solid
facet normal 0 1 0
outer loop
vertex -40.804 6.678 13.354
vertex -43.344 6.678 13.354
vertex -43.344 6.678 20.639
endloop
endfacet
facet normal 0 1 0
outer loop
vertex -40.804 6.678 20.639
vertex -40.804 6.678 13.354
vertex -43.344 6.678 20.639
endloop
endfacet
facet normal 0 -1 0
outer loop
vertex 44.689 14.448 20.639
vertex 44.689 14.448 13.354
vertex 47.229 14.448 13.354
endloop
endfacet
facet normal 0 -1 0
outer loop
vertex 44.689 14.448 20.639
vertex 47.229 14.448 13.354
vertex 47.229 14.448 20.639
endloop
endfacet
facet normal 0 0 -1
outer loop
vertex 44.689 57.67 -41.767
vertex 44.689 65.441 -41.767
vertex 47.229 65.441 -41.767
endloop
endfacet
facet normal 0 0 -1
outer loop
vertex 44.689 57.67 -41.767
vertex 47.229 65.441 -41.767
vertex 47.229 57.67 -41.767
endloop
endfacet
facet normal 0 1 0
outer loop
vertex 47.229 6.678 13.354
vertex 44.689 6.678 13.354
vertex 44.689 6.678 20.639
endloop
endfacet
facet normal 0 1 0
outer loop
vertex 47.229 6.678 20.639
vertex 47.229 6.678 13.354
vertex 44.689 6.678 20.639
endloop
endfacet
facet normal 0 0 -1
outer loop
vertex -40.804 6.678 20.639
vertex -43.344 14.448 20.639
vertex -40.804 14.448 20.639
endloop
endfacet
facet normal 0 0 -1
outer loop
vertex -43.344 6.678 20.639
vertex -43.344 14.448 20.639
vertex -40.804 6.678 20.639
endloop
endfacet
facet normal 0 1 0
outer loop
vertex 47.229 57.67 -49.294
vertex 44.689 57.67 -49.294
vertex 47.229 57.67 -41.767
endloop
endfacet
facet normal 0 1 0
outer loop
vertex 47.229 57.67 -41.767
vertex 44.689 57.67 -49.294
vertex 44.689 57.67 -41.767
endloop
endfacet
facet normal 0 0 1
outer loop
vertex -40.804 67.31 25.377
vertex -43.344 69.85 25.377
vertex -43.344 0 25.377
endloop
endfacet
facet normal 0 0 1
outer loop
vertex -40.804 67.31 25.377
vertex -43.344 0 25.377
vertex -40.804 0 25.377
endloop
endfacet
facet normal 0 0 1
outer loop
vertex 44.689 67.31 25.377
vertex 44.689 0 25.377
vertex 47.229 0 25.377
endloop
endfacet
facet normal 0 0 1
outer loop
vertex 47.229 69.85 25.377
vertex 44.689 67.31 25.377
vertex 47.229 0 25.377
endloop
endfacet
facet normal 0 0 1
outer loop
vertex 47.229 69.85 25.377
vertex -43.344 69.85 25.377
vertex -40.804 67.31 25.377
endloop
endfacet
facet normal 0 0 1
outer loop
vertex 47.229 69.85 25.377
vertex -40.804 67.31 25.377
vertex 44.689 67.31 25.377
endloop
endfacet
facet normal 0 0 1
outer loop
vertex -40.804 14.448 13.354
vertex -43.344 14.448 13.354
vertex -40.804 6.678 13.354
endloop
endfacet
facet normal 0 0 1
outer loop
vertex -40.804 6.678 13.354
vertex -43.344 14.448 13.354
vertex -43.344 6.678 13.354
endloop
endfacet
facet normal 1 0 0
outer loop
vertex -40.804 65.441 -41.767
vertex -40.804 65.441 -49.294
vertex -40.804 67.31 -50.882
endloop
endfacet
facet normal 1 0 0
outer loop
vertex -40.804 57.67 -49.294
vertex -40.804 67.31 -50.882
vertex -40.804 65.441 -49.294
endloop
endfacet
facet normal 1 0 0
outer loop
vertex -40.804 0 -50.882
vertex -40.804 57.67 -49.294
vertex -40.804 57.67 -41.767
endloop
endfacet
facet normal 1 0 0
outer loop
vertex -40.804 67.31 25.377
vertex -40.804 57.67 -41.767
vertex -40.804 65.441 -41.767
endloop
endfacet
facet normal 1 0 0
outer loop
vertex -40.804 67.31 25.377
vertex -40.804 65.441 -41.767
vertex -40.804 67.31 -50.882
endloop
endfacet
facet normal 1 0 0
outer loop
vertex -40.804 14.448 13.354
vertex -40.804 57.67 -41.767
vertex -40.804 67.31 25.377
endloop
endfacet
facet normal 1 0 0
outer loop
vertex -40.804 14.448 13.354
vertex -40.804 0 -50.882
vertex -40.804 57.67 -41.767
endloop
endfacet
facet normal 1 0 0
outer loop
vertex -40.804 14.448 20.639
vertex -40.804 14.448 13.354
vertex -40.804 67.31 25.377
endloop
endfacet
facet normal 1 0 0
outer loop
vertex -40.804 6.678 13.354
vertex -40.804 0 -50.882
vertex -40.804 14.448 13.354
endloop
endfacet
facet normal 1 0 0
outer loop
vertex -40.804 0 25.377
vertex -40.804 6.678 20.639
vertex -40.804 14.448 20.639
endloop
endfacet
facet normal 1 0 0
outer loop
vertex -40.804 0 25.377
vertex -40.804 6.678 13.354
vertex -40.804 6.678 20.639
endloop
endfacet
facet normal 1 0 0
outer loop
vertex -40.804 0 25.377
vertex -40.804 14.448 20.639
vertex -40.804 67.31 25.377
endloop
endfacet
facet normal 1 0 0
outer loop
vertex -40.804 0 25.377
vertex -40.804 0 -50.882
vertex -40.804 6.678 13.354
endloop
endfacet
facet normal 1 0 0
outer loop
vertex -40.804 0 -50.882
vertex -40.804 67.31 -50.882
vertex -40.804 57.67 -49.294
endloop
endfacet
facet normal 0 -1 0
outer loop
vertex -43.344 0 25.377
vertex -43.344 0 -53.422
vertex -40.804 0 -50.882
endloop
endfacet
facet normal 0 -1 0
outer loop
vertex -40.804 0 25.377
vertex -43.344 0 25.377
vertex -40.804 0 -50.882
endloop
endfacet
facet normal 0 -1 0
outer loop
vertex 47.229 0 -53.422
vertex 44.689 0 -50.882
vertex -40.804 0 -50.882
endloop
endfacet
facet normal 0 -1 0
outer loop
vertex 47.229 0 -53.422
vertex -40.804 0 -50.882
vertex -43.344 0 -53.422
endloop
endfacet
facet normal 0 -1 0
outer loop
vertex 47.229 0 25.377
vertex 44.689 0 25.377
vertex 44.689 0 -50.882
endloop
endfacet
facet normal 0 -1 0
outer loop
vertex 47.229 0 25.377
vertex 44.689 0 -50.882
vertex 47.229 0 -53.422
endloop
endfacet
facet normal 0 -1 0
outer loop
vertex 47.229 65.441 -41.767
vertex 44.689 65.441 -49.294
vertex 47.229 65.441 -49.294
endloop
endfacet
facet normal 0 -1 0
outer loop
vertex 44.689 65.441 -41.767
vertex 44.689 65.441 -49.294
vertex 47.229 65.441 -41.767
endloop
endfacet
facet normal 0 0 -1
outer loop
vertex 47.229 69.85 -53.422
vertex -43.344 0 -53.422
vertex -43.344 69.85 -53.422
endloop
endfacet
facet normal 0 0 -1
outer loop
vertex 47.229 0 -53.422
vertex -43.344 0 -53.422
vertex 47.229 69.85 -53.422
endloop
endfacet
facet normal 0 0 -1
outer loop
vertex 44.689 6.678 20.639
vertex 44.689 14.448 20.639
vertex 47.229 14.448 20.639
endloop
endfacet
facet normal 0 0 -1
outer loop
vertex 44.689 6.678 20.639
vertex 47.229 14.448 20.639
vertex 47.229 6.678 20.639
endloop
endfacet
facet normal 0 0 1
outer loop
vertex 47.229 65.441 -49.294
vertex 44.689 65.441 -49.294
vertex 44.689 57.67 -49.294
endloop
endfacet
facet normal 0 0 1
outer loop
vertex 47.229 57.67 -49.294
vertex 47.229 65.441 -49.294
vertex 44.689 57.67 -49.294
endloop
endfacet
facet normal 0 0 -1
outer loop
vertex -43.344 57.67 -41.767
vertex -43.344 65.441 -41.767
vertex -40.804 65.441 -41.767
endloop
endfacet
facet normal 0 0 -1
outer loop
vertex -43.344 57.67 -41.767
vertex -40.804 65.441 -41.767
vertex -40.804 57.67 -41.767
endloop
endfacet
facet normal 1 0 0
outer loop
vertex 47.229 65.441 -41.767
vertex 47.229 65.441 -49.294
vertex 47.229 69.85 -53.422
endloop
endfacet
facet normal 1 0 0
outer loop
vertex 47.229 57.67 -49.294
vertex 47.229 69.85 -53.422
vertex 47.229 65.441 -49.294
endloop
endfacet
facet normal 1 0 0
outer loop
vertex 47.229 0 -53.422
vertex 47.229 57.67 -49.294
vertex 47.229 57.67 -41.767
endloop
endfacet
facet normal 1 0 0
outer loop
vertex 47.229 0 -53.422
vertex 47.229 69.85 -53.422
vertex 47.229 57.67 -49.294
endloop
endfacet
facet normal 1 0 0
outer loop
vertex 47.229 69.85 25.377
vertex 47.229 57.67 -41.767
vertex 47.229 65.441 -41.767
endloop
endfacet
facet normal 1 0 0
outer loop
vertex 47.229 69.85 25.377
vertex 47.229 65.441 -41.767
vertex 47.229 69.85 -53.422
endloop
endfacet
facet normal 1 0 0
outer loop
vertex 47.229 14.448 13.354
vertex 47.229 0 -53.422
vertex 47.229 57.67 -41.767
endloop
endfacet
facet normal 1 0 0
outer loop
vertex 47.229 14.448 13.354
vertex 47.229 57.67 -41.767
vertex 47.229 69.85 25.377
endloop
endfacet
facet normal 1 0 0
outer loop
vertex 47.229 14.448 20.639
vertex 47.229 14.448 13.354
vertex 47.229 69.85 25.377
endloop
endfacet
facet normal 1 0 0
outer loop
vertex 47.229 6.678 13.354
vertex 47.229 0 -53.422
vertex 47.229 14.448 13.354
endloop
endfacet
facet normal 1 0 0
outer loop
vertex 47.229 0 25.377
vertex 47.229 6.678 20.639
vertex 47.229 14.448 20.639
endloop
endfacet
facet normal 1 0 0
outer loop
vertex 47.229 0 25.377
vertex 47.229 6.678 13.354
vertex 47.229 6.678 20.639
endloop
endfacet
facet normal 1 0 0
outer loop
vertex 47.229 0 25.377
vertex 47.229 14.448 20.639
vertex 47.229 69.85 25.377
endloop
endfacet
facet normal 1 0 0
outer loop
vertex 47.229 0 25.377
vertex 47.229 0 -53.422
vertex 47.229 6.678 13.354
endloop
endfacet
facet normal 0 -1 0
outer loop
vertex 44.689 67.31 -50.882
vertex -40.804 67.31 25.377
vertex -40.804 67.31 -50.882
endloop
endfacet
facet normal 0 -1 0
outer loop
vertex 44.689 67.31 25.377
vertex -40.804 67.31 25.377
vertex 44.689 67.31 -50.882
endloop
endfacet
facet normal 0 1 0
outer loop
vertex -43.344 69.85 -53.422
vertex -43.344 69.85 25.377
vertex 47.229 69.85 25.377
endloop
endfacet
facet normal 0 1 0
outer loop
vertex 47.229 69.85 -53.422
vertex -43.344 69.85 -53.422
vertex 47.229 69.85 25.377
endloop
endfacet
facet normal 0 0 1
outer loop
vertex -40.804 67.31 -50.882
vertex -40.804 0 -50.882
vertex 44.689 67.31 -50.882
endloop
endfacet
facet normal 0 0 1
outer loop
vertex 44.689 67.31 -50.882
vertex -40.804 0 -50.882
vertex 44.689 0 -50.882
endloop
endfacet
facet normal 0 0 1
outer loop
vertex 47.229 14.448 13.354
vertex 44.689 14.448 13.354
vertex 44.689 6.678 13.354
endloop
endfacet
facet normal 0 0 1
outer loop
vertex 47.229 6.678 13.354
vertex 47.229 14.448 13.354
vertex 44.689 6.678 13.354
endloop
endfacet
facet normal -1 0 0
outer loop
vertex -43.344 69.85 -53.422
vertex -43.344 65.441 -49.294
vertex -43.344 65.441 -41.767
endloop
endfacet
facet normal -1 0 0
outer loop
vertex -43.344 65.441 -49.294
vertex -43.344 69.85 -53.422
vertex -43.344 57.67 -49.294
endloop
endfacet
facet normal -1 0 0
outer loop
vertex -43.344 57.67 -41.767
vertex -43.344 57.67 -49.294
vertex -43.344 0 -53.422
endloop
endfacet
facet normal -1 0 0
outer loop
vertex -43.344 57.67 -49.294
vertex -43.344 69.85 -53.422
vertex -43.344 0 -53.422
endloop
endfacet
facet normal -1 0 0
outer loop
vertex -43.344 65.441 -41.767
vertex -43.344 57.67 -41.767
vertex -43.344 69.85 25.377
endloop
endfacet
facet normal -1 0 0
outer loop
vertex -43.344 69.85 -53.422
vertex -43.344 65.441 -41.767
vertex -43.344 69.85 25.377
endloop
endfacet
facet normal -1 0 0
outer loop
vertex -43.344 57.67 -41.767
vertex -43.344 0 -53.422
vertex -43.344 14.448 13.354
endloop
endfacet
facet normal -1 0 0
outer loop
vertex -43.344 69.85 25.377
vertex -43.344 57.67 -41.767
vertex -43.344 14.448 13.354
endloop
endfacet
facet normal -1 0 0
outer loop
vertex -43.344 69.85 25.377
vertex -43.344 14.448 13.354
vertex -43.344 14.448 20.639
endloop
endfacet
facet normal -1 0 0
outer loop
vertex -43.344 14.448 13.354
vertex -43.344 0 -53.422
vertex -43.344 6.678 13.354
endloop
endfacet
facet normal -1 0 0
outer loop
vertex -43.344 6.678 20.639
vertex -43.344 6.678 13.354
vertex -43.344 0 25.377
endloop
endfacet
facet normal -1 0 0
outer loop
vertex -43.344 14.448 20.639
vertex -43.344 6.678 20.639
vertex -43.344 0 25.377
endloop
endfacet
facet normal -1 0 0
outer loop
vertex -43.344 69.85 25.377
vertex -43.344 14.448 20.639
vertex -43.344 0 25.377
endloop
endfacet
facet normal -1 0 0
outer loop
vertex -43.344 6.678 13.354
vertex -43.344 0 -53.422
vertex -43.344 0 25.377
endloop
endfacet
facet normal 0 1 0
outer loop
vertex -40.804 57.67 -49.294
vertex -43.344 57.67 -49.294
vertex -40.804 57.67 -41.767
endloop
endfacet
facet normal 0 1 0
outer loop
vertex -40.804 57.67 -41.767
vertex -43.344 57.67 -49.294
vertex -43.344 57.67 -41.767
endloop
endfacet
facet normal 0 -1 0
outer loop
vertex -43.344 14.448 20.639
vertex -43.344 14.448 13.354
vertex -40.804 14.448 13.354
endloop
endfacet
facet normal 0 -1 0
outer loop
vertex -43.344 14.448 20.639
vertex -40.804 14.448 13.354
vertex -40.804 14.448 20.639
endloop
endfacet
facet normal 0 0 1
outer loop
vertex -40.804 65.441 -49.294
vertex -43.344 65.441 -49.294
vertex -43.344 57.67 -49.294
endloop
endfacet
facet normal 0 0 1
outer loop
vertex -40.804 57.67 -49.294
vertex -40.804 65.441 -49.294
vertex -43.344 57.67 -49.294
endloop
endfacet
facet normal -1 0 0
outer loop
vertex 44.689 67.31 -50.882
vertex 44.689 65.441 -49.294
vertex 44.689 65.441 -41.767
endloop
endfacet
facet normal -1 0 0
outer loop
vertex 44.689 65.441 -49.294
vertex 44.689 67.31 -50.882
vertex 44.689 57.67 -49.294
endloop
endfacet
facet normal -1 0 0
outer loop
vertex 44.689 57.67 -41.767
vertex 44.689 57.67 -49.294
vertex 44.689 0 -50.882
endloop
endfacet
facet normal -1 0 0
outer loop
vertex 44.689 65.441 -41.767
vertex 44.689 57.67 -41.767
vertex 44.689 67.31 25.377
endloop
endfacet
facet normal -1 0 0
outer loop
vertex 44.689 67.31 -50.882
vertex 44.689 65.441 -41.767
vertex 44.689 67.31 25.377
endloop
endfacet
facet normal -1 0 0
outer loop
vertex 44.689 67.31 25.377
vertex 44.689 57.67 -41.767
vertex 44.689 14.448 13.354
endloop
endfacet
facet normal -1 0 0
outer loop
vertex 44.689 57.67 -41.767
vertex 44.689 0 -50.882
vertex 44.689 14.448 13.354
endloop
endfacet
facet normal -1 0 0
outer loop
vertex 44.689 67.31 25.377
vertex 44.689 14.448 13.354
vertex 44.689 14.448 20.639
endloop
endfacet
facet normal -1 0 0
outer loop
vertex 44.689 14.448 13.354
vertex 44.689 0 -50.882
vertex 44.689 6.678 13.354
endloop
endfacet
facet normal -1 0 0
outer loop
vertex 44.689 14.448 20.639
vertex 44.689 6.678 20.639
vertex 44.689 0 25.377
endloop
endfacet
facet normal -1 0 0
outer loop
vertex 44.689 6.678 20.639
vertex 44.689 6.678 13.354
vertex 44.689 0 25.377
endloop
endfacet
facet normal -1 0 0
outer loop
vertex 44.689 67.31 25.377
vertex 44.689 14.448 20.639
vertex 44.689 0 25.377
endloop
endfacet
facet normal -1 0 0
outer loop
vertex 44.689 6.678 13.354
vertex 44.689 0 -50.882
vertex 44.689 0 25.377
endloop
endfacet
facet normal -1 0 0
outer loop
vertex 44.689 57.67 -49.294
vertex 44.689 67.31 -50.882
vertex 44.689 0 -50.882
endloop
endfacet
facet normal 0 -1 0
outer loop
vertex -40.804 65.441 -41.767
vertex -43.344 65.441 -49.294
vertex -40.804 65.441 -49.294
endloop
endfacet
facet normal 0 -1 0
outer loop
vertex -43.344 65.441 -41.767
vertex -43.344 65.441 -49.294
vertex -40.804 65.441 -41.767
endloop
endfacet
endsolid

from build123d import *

# Parameters (mm, degrees)
F0_W     = 90.5727781355
F0_H     = 92.5153568387
F1_DEPTH = 69.85
F2_T     = -2.54
F3_W     = 90.5727781355
F3_H     = 69.85
F4_DEPTH = 13.716
F5_W     = 7.770318538
F5_H     = 7.2846729308
F5_H_2   = 7.5274929404
F6_DEPTH = 90.5737781355


with BuildPart() as f1:
    # F0 (on Front) → F1 (new body)
    with BuildSketch(Plane.XZ):
        with Locations((1.9425805658, -7.1646422148)):
            Rectangle(F0_W, F0_H)
    extrude(amount=-F1_DEPTH)

    # F2
    f2_openings = [f1.faces().sort_by_distance(p)[0] for p in [
        (1.942581, 0, -7.164642),
    ]]
    offset(amount=F2_T, openings=f2_openings)

    # F3 (on face) → F4 (cut)
    with BuildSketch(Plane.XY.offset(39.0930362046)):
        with Locations((1.9425805658, 34.925)):
            Rectangle(F3_W, F3_H)
    extrude(amount=-F4_DEPTH, mode=Mode.SUBTRACT)

    # F5 (on face) → F6 (cut, through all)
    with BuildSketch(Plane(origin=(-43.343808502, 0, 0), x_dir=(0, -1, 0), z_dir=(-1, 0, 0))):
        with Locations((-10.5627775192, 16.9961908832)):
            Rectangle(F5_W, F5_H)
        with Locations((-61.5554954857, -45.5305911601)):
            Rectangle(F5_W, F5_H_2)
    extrude(amount=-F6_DEPTH, mode=Mode.SUBTRACT)


solid = f1.part
